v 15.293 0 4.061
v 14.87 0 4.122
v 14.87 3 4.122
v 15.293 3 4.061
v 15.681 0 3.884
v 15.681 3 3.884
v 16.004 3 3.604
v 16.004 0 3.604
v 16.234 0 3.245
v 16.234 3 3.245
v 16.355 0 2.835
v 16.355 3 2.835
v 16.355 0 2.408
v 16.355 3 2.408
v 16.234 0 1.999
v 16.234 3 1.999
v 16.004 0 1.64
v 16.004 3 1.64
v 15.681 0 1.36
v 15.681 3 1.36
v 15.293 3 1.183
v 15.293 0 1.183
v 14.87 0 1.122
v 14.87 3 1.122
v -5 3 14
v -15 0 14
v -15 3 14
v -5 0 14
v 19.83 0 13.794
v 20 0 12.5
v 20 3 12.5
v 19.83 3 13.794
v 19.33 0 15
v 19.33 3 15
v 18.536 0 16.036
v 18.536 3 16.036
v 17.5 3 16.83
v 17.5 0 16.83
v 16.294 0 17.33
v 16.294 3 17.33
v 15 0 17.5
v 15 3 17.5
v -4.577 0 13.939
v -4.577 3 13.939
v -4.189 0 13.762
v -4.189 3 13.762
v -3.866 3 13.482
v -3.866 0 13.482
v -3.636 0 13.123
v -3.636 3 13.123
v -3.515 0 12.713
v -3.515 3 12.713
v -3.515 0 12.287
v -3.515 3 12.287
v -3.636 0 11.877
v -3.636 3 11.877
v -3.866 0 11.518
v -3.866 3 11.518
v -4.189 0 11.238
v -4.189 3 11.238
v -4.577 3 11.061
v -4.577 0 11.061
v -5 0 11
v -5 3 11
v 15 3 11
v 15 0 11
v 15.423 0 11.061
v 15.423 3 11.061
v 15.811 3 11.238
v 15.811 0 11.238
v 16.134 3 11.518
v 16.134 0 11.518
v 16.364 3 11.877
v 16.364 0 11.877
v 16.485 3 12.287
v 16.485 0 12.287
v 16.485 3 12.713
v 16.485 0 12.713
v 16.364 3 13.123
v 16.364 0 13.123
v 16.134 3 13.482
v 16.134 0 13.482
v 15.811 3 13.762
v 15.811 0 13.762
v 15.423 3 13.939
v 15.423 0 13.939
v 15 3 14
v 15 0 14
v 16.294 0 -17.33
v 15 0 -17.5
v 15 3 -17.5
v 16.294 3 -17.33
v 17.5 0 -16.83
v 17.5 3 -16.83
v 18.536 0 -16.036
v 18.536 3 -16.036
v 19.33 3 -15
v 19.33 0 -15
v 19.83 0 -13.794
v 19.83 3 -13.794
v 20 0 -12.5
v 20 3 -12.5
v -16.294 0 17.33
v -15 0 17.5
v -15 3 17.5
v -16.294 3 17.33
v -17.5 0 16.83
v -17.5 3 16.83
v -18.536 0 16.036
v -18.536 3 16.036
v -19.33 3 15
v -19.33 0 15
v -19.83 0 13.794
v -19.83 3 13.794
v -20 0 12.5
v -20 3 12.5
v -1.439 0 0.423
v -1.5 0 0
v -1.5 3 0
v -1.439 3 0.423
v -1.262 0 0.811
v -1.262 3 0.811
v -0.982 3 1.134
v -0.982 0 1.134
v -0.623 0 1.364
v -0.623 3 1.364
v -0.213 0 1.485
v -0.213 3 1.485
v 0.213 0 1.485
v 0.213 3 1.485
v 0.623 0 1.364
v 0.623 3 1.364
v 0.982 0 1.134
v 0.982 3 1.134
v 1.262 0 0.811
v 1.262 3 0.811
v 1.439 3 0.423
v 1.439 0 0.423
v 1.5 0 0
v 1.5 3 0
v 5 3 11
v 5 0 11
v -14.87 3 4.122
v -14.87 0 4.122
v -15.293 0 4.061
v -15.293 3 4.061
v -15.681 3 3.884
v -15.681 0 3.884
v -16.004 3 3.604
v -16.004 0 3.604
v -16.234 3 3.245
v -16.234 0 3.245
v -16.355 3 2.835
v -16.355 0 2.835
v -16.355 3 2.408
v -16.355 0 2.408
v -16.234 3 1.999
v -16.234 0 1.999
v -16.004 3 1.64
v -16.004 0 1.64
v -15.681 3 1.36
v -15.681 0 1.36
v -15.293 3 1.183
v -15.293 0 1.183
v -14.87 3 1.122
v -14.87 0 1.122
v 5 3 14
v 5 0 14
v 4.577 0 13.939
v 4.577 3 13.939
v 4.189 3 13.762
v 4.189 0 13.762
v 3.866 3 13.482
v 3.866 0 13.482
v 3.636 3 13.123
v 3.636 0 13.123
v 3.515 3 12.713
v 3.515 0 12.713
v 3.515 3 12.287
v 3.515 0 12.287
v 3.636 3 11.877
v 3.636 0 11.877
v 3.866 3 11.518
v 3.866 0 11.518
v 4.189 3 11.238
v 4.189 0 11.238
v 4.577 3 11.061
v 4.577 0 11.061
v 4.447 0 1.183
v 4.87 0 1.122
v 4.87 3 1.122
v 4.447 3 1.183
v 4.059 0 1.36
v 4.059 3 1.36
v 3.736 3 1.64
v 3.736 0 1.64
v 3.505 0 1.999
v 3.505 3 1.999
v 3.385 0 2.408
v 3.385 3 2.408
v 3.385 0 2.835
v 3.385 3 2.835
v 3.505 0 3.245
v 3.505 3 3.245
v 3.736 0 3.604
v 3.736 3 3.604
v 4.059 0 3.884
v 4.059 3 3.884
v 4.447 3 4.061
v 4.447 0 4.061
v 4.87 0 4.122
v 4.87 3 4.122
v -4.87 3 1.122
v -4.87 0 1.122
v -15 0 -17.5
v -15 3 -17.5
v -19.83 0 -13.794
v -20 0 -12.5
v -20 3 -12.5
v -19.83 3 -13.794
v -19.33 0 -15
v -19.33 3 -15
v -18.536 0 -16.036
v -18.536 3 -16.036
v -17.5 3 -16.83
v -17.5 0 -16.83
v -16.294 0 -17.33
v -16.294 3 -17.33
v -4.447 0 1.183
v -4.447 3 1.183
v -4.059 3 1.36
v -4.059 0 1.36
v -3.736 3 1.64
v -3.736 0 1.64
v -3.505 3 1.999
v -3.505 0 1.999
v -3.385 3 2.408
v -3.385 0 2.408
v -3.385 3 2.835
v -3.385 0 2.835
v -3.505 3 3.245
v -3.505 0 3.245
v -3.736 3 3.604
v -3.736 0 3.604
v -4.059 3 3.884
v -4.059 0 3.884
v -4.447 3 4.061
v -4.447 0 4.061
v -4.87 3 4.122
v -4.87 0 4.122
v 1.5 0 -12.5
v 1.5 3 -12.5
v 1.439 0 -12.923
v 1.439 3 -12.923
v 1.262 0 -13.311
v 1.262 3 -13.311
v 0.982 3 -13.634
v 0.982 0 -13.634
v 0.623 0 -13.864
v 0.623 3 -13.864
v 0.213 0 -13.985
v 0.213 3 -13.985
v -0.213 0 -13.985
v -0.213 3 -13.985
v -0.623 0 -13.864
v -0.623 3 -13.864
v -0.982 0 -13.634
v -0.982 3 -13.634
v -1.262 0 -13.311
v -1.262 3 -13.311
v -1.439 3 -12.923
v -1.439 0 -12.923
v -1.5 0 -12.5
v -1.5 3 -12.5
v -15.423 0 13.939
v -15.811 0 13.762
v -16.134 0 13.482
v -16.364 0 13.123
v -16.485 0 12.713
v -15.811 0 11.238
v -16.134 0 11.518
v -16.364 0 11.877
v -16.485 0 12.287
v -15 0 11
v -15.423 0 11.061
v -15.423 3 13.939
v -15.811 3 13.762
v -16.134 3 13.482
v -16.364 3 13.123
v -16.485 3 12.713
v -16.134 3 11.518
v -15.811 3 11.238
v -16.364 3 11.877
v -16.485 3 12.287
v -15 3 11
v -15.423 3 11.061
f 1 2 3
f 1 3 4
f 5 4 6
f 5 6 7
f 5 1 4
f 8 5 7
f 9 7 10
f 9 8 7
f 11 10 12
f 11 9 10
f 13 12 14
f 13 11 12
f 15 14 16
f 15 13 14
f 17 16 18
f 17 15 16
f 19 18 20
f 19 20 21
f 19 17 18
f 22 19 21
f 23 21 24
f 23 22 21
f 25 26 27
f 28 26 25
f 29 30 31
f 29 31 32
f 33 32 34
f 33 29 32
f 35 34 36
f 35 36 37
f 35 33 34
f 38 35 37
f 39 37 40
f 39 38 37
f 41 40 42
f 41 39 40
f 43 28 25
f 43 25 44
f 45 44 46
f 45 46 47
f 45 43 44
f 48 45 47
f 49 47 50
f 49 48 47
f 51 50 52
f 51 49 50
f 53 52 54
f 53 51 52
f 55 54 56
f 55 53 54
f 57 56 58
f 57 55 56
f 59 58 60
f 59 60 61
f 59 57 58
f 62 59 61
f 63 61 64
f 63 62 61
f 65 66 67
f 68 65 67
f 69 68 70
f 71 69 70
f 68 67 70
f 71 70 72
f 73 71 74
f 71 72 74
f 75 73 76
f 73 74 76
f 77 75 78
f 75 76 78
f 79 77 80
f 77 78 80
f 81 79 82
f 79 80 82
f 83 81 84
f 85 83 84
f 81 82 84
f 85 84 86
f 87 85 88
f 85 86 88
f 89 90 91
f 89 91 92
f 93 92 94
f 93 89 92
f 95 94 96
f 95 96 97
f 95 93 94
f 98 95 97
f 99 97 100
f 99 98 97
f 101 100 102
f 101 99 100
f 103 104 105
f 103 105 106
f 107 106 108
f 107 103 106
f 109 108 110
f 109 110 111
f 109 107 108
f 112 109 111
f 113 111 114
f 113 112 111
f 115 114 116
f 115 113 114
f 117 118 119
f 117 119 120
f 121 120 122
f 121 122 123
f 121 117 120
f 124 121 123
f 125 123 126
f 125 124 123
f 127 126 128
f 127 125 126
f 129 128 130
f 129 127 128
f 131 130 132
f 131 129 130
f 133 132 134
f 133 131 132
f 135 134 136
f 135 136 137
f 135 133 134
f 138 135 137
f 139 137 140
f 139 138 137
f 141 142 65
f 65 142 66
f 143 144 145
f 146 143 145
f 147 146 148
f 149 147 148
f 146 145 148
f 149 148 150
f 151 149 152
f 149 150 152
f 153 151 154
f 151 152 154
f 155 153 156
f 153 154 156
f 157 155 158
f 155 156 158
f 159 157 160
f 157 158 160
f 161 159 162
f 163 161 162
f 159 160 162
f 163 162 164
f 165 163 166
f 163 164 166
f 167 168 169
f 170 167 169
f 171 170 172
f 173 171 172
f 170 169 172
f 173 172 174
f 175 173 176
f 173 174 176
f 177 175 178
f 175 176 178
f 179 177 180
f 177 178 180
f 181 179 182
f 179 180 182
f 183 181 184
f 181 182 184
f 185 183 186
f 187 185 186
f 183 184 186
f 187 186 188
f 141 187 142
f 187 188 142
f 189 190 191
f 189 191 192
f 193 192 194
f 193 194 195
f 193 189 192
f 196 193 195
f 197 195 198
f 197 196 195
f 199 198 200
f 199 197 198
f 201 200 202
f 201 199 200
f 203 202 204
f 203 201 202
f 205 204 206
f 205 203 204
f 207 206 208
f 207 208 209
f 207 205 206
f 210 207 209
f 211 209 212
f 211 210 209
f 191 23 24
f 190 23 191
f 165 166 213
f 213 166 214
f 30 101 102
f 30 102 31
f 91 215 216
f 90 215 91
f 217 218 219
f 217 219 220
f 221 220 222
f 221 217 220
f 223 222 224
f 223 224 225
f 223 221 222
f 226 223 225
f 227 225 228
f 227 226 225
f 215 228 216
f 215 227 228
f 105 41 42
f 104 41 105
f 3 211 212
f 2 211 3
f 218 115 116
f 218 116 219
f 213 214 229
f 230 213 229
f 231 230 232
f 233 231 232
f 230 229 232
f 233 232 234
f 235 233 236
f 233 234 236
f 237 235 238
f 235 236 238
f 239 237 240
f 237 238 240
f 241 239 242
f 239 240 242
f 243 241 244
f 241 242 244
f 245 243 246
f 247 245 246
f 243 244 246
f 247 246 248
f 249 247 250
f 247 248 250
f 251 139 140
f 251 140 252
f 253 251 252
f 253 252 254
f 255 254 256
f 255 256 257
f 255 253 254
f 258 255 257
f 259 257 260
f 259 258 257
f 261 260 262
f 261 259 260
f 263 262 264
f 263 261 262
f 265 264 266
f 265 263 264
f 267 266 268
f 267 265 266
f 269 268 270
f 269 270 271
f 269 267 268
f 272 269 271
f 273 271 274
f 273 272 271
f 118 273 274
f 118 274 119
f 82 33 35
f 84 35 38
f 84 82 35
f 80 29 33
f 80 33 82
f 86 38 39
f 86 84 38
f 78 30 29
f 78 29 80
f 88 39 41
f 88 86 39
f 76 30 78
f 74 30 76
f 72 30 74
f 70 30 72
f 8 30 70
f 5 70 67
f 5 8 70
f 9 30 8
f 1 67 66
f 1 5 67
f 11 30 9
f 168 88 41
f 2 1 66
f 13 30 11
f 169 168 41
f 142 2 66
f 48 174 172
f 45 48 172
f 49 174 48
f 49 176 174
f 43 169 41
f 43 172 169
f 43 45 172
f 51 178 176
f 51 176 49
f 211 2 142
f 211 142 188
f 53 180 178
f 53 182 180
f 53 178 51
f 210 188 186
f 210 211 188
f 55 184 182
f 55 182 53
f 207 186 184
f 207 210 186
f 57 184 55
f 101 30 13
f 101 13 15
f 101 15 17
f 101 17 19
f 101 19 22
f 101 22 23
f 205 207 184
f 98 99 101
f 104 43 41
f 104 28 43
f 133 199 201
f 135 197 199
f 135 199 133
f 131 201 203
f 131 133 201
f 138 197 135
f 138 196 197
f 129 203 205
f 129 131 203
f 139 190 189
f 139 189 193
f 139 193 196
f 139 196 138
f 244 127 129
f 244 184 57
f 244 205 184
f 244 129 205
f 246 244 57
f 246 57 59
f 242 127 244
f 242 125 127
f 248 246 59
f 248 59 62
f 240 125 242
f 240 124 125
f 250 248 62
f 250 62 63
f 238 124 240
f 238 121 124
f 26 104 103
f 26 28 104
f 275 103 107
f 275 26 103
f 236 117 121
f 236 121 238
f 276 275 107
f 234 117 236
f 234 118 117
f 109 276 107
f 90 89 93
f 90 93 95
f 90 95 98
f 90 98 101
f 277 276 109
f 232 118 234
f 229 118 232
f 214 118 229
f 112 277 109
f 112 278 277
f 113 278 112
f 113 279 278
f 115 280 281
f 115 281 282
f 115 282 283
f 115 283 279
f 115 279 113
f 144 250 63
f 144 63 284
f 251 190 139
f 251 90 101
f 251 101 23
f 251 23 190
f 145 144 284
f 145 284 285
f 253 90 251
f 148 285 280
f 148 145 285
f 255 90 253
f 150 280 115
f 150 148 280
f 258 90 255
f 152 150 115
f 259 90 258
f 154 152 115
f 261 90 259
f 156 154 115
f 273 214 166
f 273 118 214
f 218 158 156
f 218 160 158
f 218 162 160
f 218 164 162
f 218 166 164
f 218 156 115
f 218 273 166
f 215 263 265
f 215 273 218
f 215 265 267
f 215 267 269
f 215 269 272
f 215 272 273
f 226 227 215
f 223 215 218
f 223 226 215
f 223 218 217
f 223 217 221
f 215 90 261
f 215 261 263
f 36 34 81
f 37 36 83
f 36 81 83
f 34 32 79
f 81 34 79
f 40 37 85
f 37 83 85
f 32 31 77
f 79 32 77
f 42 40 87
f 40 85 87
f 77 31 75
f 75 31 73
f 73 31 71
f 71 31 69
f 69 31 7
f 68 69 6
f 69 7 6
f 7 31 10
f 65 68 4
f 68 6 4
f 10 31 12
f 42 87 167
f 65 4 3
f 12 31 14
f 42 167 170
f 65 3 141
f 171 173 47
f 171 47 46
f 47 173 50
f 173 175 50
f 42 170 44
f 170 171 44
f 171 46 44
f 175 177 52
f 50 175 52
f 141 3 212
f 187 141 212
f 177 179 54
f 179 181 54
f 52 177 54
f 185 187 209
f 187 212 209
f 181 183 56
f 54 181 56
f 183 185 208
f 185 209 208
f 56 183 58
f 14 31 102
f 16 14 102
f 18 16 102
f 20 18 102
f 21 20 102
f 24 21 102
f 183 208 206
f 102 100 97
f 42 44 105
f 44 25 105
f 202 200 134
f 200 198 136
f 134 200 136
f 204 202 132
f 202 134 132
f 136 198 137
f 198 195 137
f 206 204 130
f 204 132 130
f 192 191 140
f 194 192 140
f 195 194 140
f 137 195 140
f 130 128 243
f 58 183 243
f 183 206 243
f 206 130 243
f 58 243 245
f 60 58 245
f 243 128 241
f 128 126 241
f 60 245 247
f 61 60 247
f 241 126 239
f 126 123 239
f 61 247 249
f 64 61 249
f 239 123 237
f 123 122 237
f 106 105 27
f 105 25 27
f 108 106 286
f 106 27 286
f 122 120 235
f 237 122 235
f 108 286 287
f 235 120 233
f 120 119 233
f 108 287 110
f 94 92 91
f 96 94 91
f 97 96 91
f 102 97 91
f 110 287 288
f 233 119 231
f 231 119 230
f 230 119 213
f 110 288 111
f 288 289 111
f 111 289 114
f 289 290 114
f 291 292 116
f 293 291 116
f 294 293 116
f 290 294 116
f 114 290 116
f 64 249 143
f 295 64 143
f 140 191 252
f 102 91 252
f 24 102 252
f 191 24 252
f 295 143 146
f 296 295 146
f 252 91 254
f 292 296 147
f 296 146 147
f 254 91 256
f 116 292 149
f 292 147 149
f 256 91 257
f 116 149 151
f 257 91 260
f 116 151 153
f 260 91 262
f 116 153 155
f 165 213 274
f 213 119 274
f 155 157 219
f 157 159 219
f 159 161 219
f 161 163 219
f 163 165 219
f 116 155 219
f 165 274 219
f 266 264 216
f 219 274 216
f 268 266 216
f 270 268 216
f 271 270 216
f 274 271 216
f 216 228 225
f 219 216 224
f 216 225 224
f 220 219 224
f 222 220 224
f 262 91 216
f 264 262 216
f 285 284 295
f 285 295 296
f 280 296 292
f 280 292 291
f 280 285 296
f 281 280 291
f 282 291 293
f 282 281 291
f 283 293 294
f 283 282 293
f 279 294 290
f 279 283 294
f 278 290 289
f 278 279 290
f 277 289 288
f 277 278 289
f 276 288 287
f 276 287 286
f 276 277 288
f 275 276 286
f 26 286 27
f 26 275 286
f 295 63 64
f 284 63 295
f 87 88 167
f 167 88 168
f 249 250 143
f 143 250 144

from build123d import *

# Parameters (mm, degrees)
EXTRUDE_1_DEPTH = 3


with BuildPart() as part:
    # 草图1 → 凸台-拉伸1 (new body)
    with BuildSketch(Plane(origin=(0, 0, 0), x_dir=(1, 0, 0), z_dir=(0, 1, 0))):
        with BuildLine():
            Line((-15, 17.5), (15, 17.5))
            ThreePointArc((15, 17.5), (18.535533906, 16.035533906), (20, 12.5))
            Line((20, 12.5), (20, -12.5))
            ThreePointArc((20, -12.5), (18.535533906, -16.035533906), (15, -17.5))
            Line((15, -17.5), (-15, -17.5))
            ThreePointArc((-15, -17.5), (-18.535533906, -16.035533906), (-20, -12.5))
            Line((-20, -12.5), (-20, 12.5))
            ThreePointArc((-20, 12.5), (-18.535533906, 16.035533906), (-15, 17.5))
        make_face()
        with BuildLine():
            Line((5, -11), (15, -11))
            ThreePointArc((15, -11), (16.5, -12.5), (15, -14))
            Line((15, -14), (5, -14))
            ThreePointArc((5, -14), (3.5, -12.5), (5, -11))
        make_face(mode=Mode.SUBTRACT)
        with BuildLine():
            Line((-15, -14), (-5, -14))
            ThreePointArc((-5, -14), (-3.5, -12.5), (-5, -11))
            Line((-5, -11), (-15, -11))
            ThreePointArc((-15, -11), (-16.5, -12.5), (-15, -14))
        make_face(mode=Mode.SUBTRACT)
        with BuildLine():
            Line((-14.869936395, -1.121838378), (-4.869936395, -1.121838378))
            ThreePointArc((-4.869936395, -1.121838378), (-3.369936395, -2.621838378), (-4.869936395, -4.121838378))
            Line((-4.869936395, -4.121838378), (-14.869936395, -4.121838378))
            ThreePointArc((-14.869936395, -4.121838378), (-16.369936395, -2.621838378), (-14.869936395, -1.121838378))
        make_face(mode=Mode.SUBTRACT)
        with BuildLine():
            Line((4.869936395, -4.121838378), (14.869936395, -4.121838378))
            ThreePointArc((14.869936395, -4.121838378), (16.369936395, -2.621838378), (14.869936395, -1.121838378))
            Line((14.869936395, -1.121838378), (4.869936395, -1.121838378))
            ThreePointArc((4.869936395, -1.121838378), (3.369936395, -2.621838378), (4.869936395, -4.121838378))
        make_face(mode=Mode.SUBTRACT)
        with BuildLine():
            Line((-1.5, 12.5), (-1.5, 0))
            ThreePointArc((-1.5, 0), (0, -1.5), (1.5, 0))
            Line((1.5, 0), (1.5, 12.5))
            ThreePointArc((1.5, 12.5), (0, 14), (-1.5, 12.5))
        make_face(mode=Mode.SUBTRACT)
    extrude(amount=EXTRUDE_1_DEPTH)


solid = part.part
